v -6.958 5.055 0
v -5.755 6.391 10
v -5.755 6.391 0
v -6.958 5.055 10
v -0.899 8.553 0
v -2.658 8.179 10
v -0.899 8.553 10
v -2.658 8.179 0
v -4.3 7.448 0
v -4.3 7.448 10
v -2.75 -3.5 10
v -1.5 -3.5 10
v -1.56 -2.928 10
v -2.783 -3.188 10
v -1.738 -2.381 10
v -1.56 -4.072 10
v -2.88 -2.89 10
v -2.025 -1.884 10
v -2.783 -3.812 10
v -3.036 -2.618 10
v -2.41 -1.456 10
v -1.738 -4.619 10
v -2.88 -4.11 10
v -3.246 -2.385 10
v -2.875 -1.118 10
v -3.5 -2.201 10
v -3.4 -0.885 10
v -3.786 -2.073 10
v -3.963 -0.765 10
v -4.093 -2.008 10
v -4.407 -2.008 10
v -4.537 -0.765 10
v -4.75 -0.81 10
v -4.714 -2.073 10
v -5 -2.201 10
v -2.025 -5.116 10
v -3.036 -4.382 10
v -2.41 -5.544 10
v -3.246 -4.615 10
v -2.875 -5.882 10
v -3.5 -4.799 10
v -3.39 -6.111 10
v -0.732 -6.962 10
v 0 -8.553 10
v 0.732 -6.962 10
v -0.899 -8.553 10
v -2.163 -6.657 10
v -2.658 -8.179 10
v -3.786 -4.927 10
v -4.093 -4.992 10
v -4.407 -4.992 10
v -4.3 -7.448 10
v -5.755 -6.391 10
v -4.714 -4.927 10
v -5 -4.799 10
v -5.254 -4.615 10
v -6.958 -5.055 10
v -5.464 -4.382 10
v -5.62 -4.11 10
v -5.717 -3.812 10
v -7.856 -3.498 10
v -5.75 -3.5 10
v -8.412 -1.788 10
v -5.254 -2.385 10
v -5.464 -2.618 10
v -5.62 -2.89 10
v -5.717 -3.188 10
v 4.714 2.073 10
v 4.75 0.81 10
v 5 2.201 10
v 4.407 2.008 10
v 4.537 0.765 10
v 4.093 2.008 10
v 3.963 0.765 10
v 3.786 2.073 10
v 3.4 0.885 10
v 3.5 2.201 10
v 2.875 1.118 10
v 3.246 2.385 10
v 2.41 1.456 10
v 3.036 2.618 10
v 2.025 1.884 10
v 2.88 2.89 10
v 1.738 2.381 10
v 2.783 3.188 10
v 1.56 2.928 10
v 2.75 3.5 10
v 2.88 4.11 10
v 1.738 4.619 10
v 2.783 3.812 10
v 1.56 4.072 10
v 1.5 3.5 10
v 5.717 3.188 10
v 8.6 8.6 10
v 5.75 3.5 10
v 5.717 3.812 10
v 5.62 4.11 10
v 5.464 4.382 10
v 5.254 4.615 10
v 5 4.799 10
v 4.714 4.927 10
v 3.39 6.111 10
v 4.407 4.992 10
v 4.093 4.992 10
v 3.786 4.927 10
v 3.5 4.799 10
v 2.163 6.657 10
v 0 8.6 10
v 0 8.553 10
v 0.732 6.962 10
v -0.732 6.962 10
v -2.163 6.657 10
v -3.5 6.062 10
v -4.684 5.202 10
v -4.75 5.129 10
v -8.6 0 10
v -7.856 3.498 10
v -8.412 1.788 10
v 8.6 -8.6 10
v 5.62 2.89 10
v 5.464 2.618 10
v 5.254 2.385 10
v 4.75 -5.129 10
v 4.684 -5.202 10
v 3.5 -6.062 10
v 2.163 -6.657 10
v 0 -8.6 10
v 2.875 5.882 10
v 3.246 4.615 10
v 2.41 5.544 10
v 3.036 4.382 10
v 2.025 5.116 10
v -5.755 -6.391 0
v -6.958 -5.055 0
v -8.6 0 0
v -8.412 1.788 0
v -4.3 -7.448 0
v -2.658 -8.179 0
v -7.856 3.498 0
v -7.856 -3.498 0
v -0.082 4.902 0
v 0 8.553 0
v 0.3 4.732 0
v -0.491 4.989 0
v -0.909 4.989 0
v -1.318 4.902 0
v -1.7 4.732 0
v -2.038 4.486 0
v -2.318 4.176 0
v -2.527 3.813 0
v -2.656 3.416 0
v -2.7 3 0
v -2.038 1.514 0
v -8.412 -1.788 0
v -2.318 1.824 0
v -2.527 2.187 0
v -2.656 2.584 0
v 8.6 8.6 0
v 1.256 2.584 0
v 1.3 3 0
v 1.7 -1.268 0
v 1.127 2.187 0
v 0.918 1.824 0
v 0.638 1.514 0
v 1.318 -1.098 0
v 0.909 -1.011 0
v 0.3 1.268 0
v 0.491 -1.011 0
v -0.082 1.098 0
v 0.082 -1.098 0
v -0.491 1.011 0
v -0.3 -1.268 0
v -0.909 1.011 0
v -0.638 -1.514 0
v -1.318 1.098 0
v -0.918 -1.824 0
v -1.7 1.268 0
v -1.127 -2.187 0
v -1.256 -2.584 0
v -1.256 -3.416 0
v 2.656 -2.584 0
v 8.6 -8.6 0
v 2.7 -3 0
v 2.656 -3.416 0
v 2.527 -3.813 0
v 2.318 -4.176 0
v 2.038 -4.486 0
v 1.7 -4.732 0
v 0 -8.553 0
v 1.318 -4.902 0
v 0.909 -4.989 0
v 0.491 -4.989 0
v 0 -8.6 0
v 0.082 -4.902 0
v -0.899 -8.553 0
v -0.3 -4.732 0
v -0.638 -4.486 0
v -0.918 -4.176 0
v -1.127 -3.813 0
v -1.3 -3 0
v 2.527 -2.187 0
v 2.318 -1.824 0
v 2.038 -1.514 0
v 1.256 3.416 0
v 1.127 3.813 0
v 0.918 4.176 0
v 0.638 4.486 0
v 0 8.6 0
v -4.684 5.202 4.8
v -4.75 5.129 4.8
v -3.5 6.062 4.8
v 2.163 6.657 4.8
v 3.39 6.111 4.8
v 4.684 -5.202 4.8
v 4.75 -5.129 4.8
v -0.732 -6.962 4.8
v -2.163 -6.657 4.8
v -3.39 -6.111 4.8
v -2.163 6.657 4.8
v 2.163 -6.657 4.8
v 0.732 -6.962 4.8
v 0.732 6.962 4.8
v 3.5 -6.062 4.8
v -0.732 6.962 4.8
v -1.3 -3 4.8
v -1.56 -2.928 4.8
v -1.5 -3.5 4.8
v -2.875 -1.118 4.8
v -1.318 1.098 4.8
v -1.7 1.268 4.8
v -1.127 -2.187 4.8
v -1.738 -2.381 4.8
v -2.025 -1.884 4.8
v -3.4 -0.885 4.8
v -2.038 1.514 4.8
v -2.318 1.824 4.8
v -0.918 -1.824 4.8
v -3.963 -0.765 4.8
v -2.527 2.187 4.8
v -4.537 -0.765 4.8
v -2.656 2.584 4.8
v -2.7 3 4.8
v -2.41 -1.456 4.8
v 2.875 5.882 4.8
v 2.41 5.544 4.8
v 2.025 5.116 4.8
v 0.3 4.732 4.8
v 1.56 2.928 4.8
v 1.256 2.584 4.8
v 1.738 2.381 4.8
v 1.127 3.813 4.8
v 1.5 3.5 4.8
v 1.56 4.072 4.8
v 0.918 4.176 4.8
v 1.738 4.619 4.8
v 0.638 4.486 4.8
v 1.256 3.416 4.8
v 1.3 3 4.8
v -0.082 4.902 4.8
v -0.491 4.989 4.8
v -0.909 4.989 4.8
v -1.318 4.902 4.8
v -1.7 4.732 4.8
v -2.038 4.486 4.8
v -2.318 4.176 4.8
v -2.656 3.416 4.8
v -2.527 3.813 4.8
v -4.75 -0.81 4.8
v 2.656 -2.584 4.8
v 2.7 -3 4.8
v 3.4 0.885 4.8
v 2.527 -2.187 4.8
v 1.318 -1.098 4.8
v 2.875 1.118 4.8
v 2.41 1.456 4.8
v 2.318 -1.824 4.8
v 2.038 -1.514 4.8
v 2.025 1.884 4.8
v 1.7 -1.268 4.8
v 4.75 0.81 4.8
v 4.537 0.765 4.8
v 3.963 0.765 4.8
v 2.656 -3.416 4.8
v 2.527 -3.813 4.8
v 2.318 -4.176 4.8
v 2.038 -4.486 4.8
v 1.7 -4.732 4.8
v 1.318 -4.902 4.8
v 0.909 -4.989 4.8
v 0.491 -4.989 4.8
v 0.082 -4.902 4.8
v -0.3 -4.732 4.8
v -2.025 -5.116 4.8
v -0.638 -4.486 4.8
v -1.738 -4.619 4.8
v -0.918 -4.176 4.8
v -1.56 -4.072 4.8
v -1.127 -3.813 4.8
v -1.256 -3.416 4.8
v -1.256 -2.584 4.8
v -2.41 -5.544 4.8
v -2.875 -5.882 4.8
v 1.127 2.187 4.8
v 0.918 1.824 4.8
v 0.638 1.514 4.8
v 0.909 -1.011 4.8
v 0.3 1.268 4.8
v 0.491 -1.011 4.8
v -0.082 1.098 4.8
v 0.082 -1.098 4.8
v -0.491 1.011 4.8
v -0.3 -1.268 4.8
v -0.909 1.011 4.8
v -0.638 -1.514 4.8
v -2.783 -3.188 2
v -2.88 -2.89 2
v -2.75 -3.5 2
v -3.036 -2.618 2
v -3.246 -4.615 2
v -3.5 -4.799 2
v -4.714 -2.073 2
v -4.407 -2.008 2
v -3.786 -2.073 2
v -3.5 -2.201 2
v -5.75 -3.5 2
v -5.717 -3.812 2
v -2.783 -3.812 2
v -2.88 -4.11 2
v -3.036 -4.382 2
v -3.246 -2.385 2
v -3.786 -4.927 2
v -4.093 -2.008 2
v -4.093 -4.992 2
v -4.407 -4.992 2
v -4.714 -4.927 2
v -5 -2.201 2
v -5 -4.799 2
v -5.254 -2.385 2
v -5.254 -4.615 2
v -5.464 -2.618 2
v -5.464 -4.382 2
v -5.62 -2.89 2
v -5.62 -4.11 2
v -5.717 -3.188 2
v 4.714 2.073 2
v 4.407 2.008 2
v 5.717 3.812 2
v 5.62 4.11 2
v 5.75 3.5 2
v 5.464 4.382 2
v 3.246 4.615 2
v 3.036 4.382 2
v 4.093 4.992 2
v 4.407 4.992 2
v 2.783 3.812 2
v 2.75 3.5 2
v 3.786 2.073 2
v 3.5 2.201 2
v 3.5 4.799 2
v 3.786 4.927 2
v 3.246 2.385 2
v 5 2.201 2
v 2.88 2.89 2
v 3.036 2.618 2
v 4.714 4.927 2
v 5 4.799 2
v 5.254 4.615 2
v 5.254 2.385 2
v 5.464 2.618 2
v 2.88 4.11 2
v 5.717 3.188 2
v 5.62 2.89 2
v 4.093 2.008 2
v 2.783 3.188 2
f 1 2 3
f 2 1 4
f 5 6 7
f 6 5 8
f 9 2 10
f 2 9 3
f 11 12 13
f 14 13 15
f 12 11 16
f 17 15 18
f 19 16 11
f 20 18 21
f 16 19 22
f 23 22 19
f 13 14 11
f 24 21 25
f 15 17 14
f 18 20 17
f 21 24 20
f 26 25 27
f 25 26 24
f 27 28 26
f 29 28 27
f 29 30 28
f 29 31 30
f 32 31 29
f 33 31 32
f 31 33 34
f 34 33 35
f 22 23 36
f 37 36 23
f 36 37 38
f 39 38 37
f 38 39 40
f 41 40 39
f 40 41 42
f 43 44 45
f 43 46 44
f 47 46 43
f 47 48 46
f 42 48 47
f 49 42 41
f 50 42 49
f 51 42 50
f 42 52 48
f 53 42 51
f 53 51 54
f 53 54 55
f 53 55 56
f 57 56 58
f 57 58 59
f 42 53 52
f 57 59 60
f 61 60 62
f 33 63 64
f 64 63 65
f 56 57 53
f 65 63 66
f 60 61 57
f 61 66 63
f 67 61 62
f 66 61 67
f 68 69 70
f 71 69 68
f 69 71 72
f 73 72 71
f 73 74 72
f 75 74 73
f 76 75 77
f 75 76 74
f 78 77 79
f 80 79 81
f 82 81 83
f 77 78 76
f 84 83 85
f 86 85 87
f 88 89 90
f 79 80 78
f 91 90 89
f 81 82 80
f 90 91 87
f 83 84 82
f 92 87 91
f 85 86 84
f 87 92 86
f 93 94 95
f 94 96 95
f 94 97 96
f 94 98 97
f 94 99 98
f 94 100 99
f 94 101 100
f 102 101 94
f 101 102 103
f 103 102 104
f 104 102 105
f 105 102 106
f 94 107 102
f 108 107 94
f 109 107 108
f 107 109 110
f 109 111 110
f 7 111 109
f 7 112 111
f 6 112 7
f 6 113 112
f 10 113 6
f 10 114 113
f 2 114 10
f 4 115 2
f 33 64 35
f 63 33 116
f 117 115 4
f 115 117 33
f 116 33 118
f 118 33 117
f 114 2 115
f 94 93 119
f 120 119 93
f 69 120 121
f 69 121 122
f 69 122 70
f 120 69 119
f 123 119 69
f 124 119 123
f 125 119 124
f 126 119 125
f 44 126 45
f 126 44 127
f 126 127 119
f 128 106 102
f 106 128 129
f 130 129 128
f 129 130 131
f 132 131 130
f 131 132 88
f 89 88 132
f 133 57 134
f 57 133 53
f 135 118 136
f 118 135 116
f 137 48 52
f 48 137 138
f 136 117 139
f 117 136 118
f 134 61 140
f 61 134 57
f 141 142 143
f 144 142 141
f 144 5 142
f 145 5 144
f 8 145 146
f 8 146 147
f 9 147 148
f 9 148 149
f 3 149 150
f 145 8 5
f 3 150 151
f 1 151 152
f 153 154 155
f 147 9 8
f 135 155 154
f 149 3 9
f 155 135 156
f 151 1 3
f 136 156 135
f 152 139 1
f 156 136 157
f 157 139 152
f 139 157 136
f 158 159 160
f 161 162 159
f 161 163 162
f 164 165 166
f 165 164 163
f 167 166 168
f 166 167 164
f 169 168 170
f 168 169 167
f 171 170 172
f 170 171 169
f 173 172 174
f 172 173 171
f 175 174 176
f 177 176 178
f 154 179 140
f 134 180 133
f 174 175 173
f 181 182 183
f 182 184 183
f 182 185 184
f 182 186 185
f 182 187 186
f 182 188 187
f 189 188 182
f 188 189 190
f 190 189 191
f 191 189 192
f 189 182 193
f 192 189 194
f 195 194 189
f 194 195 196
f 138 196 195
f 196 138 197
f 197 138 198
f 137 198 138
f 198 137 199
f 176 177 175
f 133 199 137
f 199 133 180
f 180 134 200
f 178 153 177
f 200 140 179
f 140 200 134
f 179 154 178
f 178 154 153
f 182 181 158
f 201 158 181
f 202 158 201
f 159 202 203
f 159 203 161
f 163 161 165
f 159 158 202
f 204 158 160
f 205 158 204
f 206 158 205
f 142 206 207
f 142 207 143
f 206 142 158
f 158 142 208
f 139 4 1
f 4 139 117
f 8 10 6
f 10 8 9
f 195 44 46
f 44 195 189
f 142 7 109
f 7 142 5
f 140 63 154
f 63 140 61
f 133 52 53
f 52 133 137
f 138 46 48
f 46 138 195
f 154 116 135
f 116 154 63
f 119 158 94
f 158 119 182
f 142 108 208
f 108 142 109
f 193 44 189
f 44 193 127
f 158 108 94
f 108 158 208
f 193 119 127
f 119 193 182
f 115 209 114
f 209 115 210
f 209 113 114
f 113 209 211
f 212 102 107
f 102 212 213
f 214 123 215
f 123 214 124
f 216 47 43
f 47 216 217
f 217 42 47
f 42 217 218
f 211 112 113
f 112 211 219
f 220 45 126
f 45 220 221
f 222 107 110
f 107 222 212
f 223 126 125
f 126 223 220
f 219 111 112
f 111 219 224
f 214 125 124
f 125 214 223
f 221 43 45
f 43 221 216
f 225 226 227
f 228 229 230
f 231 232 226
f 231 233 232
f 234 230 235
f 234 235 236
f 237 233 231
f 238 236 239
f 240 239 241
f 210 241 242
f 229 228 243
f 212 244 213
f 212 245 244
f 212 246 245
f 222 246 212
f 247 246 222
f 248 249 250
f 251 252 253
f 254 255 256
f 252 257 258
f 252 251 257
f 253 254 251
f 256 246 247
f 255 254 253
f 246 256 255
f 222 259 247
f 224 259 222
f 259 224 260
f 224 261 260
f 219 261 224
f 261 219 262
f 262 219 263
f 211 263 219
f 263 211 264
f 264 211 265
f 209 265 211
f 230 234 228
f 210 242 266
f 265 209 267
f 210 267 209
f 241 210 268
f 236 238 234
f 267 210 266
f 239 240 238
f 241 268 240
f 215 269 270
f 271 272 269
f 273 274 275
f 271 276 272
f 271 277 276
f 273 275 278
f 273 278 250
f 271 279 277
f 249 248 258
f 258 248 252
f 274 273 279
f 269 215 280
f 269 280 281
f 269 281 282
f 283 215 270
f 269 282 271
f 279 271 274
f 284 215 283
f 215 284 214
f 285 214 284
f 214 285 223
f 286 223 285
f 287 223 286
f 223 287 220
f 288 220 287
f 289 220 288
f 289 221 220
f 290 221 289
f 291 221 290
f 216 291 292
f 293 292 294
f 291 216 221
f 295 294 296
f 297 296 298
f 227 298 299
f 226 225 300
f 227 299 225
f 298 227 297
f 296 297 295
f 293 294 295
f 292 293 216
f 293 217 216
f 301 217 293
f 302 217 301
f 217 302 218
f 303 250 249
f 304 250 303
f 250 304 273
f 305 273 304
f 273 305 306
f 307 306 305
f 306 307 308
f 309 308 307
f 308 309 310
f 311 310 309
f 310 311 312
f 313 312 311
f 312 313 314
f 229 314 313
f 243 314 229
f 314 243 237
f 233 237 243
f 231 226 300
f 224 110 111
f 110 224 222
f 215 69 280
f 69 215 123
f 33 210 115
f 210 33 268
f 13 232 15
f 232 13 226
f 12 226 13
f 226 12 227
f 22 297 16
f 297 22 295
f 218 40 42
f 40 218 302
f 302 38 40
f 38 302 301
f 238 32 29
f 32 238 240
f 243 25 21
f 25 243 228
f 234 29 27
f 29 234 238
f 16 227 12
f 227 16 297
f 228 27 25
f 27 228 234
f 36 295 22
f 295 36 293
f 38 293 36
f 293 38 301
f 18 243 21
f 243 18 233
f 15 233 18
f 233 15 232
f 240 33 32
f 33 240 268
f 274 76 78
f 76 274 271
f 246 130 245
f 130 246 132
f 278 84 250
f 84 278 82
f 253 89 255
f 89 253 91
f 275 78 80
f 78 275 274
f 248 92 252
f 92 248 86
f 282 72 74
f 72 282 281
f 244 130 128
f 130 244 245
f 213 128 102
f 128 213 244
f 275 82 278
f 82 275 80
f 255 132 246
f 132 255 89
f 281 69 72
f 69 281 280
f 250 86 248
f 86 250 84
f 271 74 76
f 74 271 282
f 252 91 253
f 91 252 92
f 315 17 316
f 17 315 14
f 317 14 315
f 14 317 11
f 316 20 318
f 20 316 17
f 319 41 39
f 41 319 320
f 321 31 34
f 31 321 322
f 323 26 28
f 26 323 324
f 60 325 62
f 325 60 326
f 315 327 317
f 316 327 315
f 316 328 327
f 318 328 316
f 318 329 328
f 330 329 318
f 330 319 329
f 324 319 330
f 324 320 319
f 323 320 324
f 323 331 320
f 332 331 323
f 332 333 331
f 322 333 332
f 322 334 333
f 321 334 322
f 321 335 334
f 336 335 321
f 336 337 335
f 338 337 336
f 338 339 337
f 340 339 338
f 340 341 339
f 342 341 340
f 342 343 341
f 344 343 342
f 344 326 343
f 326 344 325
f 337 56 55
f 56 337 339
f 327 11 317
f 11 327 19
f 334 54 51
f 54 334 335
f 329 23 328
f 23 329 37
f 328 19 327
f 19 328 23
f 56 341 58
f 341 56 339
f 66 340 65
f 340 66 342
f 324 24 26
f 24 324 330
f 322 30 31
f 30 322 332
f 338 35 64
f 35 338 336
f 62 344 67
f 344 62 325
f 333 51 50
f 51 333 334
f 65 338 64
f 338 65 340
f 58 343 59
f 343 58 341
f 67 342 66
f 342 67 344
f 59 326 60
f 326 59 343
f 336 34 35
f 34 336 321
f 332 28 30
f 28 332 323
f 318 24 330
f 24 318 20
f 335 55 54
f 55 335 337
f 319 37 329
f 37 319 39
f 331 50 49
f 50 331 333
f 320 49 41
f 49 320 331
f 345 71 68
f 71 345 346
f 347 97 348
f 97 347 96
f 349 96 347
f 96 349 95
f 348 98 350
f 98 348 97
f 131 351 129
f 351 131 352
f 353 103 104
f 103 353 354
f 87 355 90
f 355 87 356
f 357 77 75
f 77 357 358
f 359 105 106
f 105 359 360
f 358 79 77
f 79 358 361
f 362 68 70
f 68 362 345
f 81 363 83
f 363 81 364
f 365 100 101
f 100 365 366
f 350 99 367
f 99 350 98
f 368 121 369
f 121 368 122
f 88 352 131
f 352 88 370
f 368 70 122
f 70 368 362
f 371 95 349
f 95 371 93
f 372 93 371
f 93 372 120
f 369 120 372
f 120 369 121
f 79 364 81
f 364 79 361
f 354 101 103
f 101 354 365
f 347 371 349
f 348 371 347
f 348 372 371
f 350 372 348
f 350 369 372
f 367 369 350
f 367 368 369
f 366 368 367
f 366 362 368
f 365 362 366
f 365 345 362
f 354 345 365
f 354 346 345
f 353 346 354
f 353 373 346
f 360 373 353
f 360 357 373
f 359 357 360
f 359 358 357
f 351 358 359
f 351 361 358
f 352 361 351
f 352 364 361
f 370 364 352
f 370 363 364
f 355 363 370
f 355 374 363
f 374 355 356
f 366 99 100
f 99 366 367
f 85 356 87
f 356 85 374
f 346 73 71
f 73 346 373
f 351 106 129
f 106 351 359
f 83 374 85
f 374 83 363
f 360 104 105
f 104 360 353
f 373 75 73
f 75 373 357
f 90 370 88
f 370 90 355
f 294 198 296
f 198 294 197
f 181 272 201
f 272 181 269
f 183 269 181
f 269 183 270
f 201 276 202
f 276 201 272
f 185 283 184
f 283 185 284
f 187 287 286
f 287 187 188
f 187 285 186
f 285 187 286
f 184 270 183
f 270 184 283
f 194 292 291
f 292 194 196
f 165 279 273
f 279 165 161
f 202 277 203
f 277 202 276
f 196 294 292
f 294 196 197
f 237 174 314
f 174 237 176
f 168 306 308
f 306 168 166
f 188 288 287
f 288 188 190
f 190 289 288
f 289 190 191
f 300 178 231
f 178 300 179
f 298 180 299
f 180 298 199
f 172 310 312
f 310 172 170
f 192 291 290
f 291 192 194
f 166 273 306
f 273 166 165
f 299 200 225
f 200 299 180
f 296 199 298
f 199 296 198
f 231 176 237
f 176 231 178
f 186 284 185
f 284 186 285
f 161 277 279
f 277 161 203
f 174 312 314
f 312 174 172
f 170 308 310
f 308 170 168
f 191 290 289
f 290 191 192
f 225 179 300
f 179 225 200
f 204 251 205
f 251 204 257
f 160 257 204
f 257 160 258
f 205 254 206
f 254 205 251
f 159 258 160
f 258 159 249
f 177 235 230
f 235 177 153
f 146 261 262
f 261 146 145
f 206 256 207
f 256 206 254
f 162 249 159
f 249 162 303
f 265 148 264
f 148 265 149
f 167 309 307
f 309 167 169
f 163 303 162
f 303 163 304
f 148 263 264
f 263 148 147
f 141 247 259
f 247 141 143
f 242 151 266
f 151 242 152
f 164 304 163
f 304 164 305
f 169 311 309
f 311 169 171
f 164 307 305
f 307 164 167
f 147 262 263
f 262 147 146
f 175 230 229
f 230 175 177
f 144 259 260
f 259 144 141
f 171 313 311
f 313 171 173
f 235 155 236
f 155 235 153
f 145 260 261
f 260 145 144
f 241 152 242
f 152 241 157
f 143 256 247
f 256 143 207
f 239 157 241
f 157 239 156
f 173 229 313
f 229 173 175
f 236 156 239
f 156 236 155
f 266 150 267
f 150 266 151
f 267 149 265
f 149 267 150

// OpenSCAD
screw_depth=8;
screw_hole=3;

mount_diameter=5.5;
mount_height=10;

wire_diameter=4;

wire_distance_width=6;
wire_distance_depth=1.4;

hole_distance_width=7;
hole_distance_depth=8.5;

light_diameter=17.2;
inner_light_diameter=14;
inner_light_height=5.2;
inner_light_depth=9.5;

$fn=30;

module mount();
{
    difference()
    {
        union()
        {
            difference()
            {
                union()
                {
                    cylinder(d=light_diameter, h=mount_height);
                    translate([0,-light_diameter/2,0])
                        cube([light_diameter/2,light_diameter,mount_height]);
                }
                
                
                translate([0,0,mount_height-inner_light_height])
                intersection()
                {
                    cylinder(d=inner_light_diameter, h=inner_light_height+1);
                    translate([-inner_light_depth/2,-inner_light_diameter/2,0])
                        cube([inner_light_depth,inner_light_diameter,mount_height]);
                    
                }
            }
            translate(
        [-hole_distance_depth/2,-hole_distance_width/2,mount_height-screw_depth])
                cylinder(d=mount_diameter, h=screw_depth);
            translate(
        [hole_distance_depth/2,hole_distance_width/2,mount_height-screw_depth])
                cylinder(d=mount_diameter, h=screw_depth);
            
        }
        
        #union()
        {
            translate(
            [-hole_distance_depth/2,-hole_distance_width/2,mount_height-screw_depth])
                cylinder(d=screw_hole, h=screw_depth);
            
            translate(
            [hole_distance_depth/2,hole_distance_width/2,mount_height-screw_depth])
                cylinder(d=screw_hole, h=screw_depth);
            
            translate([wire_distance_depth/2,-wire_distance_width/2,0])
                cylinder(d=wire_diameter,h=mount_height-inner_light_height+0.01);
            translate([-wire_distance_depth/2,wire_distance_width/2,0])
                cylinder(d=wire_diameter,h=mount_height-inner_light_height+0.01);
        }
        
    }
    
}



mount();
